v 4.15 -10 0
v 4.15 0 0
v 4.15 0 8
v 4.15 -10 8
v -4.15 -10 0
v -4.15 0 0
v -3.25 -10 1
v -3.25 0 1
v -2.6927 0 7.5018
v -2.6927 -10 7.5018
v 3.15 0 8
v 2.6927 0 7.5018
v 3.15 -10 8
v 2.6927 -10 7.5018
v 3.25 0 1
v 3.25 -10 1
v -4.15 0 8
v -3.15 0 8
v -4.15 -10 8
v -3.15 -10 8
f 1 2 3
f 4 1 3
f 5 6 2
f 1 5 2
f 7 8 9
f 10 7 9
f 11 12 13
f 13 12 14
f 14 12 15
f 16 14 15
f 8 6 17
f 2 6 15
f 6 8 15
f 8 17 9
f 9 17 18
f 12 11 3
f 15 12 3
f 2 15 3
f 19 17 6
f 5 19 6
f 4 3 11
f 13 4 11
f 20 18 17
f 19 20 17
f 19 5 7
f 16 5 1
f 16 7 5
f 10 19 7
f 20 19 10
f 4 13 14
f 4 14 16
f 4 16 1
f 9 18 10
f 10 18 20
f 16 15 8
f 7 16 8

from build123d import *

# Parameters (mm, degrees)
F1_DEPTH = 10
F2_SIZE  = 0.5


with BuildPart() as f1:
    # F0 (on Front) → F1 (new body)
    with BuildSketch(Plane.XZ):
        Polygon((0, 1), (0, 0), (4.15, 0), (4.15, 8), (2.65, 8), (3.25, 1), align=None)
        Polygon((-4.15, 0), (0, 0), (0, 1), (-3.25, 1), (-2.65, 8), (-4.15, 8), align=None)
    extrude(amount=F1_DEPTH)

    # F2
    f2_edges = [f1.edges().sort_by_distance(p)[0] for p in [
        (-2.65, -5, 8),
        (2.65, -5, 8),
    ]]
    chamfer(f2_edges, length=F2_SIZE)


solid = f1.part
